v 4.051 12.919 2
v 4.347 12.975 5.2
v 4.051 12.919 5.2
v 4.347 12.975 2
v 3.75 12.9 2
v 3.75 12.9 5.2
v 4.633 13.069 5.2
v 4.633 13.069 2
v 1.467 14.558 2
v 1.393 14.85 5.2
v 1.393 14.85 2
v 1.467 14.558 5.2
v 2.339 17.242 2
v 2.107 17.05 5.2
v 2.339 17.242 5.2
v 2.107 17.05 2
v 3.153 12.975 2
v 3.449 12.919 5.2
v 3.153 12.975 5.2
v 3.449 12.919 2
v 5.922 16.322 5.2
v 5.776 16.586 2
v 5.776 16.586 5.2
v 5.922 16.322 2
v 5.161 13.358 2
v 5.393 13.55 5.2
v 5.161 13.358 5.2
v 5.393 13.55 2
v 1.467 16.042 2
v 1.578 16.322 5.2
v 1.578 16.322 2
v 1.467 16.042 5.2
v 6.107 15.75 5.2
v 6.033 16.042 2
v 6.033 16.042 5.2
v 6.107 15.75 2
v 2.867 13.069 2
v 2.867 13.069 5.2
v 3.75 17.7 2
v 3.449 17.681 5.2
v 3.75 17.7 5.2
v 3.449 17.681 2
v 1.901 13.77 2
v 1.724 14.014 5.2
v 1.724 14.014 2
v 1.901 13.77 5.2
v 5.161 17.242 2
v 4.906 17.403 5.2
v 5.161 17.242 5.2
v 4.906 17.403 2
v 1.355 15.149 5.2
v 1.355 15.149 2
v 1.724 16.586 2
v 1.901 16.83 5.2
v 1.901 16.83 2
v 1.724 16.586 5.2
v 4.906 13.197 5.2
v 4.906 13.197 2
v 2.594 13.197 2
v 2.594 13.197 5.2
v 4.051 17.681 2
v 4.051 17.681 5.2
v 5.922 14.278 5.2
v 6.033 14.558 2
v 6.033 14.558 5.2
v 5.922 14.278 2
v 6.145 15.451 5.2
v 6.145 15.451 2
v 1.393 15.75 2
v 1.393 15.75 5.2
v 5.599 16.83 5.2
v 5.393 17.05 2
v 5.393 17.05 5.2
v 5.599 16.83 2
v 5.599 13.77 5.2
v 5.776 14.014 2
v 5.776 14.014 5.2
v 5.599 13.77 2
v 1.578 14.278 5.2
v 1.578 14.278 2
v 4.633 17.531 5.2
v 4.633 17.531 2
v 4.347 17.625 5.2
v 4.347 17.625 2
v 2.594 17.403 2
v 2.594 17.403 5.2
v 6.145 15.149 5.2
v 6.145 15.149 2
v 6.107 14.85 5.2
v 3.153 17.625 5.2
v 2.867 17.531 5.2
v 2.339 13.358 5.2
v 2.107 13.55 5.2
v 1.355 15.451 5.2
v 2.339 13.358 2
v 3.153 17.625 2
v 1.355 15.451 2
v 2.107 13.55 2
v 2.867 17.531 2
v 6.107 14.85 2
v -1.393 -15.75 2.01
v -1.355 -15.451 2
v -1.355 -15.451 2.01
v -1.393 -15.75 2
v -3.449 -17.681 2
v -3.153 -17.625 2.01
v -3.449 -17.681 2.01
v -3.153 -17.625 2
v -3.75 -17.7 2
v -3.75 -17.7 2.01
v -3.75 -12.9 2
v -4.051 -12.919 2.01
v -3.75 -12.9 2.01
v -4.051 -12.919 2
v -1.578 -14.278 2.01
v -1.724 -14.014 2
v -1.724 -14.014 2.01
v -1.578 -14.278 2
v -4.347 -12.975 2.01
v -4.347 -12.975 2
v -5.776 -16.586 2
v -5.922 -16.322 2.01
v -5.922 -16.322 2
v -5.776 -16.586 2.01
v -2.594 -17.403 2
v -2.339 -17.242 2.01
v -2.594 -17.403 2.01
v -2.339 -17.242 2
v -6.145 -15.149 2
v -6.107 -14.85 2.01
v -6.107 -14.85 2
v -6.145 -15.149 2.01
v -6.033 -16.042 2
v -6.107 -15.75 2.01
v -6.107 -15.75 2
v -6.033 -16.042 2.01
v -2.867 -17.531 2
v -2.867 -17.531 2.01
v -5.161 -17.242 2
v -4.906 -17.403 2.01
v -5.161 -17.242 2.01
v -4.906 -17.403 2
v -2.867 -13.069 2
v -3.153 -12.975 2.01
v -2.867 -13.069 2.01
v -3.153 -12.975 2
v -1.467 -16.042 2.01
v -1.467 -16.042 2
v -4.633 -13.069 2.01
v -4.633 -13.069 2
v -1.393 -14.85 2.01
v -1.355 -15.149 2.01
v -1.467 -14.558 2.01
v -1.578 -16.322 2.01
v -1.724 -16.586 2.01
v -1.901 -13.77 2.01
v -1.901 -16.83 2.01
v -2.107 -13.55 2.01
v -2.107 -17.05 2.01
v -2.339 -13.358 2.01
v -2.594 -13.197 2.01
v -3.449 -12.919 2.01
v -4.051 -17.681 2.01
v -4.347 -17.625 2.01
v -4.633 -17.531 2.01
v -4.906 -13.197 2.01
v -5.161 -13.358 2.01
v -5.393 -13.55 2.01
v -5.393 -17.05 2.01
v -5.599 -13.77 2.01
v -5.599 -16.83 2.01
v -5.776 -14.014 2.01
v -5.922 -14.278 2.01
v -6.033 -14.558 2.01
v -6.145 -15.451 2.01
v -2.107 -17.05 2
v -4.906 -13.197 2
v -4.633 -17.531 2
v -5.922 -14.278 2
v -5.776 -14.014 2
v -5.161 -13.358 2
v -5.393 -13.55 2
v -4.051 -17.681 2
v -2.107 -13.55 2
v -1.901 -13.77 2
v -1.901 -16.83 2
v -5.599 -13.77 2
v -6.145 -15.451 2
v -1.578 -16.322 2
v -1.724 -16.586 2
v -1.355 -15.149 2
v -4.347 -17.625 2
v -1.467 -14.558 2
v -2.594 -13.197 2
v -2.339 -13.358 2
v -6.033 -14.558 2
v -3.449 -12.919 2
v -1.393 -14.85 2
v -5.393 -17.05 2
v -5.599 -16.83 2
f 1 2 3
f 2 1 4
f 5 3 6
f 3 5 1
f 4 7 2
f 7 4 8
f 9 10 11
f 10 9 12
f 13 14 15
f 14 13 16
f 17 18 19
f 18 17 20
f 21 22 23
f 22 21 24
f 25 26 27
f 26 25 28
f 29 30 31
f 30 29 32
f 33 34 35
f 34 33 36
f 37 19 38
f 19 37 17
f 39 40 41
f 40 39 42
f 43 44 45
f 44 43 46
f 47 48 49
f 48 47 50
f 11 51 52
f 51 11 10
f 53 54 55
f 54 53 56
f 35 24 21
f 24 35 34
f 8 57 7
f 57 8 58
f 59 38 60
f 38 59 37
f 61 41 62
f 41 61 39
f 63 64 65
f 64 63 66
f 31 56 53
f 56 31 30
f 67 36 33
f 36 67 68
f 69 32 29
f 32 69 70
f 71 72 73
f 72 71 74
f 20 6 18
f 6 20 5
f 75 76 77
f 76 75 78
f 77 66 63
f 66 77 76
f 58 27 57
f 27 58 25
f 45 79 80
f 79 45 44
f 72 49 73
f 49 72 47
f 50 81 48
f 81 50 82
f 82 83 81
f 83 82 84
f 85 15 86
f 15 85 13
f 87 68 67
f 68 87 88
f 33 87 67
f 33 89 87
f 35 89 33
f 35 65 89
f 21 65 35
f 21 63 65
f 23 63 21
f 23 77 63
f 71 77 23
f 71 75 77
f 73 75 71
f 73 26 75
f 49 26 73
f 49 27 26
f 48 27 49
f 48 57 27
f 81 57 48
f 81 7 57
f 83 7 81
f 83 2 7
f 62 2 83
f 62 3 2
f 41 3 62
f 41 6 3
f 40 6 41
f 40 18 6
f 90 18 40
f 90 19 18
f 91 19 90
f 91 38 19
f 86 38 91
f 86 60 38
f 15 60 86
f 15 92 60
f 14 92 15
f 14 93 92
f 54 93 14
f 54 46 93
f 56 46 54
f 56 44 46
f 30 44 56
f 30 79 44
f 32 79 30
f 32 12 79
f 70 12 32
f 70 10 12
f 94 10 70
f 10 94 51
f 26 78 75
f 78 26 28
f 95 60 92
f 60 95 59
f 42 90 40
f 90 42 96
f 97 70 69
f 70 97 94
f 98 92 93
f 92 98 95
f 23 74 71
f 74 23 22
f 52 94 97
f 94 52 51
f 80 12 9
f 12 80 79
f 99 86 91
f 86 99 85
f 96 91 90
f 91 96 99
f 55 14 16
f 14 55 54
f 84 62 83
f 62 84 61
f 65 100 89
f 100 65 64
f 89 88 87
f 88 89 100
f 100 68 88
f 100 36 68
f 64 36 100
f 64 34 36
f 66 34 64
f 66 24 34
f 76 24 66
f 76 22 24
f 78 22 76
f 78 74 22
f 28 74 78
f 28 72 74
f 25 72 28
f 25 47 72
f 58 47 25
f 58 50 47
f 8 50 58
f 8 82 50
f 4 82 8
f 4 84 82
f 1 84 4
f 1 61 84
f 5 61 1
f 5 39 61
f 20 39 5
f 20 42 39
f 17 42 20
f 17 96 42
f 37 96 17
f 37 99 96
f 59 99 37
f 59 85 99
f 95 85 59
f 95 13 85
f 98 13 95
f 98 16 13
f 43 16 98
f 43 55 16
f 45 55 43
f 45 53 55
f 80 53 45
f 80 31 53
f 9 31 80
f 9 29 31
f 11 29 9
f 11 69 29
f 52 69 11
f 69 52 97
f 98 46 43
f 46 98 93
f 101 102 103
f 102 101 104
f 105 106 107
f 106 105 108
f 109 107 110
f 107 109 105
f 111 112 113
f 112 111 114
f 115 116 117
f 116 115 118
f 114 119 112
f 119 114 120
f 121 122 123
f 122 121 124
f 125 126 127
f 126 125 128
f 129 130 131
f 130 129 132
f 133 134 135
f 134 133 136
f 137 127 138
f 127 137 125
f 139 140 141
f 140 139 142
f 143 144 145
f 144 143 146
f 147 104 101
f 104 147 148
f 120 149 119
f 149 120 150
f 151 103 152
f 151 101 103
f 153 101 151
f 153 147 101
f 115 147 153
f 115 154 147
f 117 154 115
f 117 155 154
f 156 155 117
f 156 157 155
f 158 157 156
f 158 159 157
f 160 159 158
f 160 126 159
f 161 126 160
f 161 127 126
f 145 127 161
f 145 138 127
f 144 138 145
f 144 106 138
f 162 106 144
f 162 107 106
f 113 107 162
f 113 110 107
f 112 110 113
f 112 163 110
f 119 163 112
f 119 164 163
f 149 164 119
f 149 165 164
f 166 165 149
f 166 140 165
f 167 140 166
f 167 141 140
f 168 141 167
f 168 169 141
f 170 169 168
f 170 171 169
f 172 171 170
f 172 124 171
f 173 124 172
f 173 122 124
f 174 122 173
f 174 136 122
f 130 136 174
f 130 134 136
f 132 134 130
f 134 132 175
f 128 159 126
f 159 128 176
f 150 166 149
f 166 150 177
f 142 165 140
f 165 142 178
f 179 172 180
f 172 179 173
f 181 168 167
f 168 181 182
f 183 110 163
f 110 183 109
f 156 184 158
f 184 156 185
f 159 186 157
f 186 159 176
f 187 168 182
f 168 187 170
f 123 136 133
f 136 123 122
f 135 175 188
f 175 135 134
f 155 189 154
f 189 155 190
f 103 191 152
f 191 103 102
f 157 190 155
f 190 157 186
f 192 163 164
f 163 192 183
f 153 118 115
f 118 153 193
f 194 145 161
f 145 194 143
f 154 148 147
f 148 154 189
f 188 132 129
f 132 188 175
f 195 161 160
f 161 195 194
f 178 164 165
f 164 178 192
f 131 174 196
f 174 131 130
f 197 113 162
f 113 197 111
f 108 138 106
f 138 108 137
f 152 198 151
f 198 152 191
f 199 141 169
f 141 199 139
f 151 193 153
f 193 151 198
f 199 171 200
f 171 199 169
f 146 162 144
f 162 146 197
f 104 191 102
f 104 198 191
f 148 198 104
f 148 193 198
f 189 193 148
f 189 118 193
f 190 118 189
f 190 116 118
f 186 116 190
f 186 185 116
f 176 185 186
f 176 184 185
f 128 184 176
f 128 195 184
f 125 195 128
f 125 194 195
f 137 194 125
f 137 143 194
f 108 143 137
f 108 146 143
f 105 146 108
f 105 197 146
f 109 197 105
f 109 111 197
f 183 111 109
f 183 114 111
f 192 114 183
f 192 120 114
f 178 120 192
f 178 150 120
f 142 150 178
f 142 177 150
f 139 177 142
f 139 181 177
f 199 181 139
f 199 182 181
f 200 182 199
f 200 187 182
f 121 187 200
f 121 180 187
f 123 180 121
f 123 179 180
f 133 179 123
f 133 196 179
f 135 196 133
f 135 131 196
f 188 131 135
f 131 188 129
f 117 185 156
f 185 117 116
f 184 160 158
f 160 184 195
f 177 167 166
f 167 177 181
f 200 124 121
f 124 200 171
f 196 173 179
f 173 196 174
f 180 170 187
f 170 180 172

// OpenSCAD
offsetx = -4.5;
offsety = -4.5;
diam = 16;
spacex = 18;
spacey = 9;
factor = 0.3;
corps_h = 0;
coeur_h = 3.2;
plaque_h = 2;

diameter = diam * factor;
space_x = spacex * factor + diameter;
space_y = spacey * factor + diameter;

plaque_x = (8 * diam + 8 * spacex) * factor;
plaque_y = (8 * diam + 7 * spacey + spacex) * factor;
plaque_z = plaque_h;

p=[
	[
		[1+offsetx, 4+offsety],
		[2+offsetx, 5+offsety]
	],
	[
		[3+offsetx, 1+offsety],
		[4+offsetx, 8+offsety]
	],
	[
		[5+offsetx, 3+offsety],
		[6+offsetx, 6+offsety]
	],
	[
		[7+offsetx, 2+offsety],
		[8+offsetx, 3+offsety]
	],
	[
		[7+offsetx, 6+offsety],
		[8+offsetx, 7+offsety]
	]
];

points = [[1+offsetx, 4+offsety],
[1+offsetx, 5+offsety],
[3+offsetx, 5+offsety],
[3+offsetx, 8+offsety],
[4+offsetx, 8+offsety],
[4+offsetx, 6+offsety],
[7+offsetx, 6+offsety],
[7+offsetx, 7+offsety],
[8+offsetx, 7+offsety],
[8+offsetx, 6+offsety],
[6+offsetx, 6+offsety],
[6+offsetx, 3+offsety],
[8+offsetx, 3+offsety],
[8+offsetx, 2+offsety],
[7+offsetx, 2+offsety],
[7+offsetx, 3+offsety],
[4+offsetx, 3+offsety],
[4+offsetx, 1+offsety],
[3+offsetx, 1+offsety],
[3+offsetx, 4+offsety]];


rotate([0, 0, -90])
union()
{
	/*translate([-(plaque_x / 2), -(plaque_y / 2), 0])
	cube([plaque_x, plaque_y, plaque_z]);*/
	for(carre = p)
	{
		for(x = [carre[0][0] : carre[1][0]])
		{
			for(y = [carre[0][1] : carre[1][1]])
			{
				translate([x*space_x, y*space_y, plaque_z])
				cylinder(
					$fn = 50,
					d = diameter,
					h = (x == 3+offsetx && y == 5+offsety) ? coeur_h : corps_h
				);
				translate([-x*space_x, -y*space_y, plaque_z])
				cylinder(
					$fn = 50,
					d = diameter,
					h = (x == 3+offsetx && y == 5+offsety) ? 0.01 : corps_h
				);
			}
		}
	}
}
